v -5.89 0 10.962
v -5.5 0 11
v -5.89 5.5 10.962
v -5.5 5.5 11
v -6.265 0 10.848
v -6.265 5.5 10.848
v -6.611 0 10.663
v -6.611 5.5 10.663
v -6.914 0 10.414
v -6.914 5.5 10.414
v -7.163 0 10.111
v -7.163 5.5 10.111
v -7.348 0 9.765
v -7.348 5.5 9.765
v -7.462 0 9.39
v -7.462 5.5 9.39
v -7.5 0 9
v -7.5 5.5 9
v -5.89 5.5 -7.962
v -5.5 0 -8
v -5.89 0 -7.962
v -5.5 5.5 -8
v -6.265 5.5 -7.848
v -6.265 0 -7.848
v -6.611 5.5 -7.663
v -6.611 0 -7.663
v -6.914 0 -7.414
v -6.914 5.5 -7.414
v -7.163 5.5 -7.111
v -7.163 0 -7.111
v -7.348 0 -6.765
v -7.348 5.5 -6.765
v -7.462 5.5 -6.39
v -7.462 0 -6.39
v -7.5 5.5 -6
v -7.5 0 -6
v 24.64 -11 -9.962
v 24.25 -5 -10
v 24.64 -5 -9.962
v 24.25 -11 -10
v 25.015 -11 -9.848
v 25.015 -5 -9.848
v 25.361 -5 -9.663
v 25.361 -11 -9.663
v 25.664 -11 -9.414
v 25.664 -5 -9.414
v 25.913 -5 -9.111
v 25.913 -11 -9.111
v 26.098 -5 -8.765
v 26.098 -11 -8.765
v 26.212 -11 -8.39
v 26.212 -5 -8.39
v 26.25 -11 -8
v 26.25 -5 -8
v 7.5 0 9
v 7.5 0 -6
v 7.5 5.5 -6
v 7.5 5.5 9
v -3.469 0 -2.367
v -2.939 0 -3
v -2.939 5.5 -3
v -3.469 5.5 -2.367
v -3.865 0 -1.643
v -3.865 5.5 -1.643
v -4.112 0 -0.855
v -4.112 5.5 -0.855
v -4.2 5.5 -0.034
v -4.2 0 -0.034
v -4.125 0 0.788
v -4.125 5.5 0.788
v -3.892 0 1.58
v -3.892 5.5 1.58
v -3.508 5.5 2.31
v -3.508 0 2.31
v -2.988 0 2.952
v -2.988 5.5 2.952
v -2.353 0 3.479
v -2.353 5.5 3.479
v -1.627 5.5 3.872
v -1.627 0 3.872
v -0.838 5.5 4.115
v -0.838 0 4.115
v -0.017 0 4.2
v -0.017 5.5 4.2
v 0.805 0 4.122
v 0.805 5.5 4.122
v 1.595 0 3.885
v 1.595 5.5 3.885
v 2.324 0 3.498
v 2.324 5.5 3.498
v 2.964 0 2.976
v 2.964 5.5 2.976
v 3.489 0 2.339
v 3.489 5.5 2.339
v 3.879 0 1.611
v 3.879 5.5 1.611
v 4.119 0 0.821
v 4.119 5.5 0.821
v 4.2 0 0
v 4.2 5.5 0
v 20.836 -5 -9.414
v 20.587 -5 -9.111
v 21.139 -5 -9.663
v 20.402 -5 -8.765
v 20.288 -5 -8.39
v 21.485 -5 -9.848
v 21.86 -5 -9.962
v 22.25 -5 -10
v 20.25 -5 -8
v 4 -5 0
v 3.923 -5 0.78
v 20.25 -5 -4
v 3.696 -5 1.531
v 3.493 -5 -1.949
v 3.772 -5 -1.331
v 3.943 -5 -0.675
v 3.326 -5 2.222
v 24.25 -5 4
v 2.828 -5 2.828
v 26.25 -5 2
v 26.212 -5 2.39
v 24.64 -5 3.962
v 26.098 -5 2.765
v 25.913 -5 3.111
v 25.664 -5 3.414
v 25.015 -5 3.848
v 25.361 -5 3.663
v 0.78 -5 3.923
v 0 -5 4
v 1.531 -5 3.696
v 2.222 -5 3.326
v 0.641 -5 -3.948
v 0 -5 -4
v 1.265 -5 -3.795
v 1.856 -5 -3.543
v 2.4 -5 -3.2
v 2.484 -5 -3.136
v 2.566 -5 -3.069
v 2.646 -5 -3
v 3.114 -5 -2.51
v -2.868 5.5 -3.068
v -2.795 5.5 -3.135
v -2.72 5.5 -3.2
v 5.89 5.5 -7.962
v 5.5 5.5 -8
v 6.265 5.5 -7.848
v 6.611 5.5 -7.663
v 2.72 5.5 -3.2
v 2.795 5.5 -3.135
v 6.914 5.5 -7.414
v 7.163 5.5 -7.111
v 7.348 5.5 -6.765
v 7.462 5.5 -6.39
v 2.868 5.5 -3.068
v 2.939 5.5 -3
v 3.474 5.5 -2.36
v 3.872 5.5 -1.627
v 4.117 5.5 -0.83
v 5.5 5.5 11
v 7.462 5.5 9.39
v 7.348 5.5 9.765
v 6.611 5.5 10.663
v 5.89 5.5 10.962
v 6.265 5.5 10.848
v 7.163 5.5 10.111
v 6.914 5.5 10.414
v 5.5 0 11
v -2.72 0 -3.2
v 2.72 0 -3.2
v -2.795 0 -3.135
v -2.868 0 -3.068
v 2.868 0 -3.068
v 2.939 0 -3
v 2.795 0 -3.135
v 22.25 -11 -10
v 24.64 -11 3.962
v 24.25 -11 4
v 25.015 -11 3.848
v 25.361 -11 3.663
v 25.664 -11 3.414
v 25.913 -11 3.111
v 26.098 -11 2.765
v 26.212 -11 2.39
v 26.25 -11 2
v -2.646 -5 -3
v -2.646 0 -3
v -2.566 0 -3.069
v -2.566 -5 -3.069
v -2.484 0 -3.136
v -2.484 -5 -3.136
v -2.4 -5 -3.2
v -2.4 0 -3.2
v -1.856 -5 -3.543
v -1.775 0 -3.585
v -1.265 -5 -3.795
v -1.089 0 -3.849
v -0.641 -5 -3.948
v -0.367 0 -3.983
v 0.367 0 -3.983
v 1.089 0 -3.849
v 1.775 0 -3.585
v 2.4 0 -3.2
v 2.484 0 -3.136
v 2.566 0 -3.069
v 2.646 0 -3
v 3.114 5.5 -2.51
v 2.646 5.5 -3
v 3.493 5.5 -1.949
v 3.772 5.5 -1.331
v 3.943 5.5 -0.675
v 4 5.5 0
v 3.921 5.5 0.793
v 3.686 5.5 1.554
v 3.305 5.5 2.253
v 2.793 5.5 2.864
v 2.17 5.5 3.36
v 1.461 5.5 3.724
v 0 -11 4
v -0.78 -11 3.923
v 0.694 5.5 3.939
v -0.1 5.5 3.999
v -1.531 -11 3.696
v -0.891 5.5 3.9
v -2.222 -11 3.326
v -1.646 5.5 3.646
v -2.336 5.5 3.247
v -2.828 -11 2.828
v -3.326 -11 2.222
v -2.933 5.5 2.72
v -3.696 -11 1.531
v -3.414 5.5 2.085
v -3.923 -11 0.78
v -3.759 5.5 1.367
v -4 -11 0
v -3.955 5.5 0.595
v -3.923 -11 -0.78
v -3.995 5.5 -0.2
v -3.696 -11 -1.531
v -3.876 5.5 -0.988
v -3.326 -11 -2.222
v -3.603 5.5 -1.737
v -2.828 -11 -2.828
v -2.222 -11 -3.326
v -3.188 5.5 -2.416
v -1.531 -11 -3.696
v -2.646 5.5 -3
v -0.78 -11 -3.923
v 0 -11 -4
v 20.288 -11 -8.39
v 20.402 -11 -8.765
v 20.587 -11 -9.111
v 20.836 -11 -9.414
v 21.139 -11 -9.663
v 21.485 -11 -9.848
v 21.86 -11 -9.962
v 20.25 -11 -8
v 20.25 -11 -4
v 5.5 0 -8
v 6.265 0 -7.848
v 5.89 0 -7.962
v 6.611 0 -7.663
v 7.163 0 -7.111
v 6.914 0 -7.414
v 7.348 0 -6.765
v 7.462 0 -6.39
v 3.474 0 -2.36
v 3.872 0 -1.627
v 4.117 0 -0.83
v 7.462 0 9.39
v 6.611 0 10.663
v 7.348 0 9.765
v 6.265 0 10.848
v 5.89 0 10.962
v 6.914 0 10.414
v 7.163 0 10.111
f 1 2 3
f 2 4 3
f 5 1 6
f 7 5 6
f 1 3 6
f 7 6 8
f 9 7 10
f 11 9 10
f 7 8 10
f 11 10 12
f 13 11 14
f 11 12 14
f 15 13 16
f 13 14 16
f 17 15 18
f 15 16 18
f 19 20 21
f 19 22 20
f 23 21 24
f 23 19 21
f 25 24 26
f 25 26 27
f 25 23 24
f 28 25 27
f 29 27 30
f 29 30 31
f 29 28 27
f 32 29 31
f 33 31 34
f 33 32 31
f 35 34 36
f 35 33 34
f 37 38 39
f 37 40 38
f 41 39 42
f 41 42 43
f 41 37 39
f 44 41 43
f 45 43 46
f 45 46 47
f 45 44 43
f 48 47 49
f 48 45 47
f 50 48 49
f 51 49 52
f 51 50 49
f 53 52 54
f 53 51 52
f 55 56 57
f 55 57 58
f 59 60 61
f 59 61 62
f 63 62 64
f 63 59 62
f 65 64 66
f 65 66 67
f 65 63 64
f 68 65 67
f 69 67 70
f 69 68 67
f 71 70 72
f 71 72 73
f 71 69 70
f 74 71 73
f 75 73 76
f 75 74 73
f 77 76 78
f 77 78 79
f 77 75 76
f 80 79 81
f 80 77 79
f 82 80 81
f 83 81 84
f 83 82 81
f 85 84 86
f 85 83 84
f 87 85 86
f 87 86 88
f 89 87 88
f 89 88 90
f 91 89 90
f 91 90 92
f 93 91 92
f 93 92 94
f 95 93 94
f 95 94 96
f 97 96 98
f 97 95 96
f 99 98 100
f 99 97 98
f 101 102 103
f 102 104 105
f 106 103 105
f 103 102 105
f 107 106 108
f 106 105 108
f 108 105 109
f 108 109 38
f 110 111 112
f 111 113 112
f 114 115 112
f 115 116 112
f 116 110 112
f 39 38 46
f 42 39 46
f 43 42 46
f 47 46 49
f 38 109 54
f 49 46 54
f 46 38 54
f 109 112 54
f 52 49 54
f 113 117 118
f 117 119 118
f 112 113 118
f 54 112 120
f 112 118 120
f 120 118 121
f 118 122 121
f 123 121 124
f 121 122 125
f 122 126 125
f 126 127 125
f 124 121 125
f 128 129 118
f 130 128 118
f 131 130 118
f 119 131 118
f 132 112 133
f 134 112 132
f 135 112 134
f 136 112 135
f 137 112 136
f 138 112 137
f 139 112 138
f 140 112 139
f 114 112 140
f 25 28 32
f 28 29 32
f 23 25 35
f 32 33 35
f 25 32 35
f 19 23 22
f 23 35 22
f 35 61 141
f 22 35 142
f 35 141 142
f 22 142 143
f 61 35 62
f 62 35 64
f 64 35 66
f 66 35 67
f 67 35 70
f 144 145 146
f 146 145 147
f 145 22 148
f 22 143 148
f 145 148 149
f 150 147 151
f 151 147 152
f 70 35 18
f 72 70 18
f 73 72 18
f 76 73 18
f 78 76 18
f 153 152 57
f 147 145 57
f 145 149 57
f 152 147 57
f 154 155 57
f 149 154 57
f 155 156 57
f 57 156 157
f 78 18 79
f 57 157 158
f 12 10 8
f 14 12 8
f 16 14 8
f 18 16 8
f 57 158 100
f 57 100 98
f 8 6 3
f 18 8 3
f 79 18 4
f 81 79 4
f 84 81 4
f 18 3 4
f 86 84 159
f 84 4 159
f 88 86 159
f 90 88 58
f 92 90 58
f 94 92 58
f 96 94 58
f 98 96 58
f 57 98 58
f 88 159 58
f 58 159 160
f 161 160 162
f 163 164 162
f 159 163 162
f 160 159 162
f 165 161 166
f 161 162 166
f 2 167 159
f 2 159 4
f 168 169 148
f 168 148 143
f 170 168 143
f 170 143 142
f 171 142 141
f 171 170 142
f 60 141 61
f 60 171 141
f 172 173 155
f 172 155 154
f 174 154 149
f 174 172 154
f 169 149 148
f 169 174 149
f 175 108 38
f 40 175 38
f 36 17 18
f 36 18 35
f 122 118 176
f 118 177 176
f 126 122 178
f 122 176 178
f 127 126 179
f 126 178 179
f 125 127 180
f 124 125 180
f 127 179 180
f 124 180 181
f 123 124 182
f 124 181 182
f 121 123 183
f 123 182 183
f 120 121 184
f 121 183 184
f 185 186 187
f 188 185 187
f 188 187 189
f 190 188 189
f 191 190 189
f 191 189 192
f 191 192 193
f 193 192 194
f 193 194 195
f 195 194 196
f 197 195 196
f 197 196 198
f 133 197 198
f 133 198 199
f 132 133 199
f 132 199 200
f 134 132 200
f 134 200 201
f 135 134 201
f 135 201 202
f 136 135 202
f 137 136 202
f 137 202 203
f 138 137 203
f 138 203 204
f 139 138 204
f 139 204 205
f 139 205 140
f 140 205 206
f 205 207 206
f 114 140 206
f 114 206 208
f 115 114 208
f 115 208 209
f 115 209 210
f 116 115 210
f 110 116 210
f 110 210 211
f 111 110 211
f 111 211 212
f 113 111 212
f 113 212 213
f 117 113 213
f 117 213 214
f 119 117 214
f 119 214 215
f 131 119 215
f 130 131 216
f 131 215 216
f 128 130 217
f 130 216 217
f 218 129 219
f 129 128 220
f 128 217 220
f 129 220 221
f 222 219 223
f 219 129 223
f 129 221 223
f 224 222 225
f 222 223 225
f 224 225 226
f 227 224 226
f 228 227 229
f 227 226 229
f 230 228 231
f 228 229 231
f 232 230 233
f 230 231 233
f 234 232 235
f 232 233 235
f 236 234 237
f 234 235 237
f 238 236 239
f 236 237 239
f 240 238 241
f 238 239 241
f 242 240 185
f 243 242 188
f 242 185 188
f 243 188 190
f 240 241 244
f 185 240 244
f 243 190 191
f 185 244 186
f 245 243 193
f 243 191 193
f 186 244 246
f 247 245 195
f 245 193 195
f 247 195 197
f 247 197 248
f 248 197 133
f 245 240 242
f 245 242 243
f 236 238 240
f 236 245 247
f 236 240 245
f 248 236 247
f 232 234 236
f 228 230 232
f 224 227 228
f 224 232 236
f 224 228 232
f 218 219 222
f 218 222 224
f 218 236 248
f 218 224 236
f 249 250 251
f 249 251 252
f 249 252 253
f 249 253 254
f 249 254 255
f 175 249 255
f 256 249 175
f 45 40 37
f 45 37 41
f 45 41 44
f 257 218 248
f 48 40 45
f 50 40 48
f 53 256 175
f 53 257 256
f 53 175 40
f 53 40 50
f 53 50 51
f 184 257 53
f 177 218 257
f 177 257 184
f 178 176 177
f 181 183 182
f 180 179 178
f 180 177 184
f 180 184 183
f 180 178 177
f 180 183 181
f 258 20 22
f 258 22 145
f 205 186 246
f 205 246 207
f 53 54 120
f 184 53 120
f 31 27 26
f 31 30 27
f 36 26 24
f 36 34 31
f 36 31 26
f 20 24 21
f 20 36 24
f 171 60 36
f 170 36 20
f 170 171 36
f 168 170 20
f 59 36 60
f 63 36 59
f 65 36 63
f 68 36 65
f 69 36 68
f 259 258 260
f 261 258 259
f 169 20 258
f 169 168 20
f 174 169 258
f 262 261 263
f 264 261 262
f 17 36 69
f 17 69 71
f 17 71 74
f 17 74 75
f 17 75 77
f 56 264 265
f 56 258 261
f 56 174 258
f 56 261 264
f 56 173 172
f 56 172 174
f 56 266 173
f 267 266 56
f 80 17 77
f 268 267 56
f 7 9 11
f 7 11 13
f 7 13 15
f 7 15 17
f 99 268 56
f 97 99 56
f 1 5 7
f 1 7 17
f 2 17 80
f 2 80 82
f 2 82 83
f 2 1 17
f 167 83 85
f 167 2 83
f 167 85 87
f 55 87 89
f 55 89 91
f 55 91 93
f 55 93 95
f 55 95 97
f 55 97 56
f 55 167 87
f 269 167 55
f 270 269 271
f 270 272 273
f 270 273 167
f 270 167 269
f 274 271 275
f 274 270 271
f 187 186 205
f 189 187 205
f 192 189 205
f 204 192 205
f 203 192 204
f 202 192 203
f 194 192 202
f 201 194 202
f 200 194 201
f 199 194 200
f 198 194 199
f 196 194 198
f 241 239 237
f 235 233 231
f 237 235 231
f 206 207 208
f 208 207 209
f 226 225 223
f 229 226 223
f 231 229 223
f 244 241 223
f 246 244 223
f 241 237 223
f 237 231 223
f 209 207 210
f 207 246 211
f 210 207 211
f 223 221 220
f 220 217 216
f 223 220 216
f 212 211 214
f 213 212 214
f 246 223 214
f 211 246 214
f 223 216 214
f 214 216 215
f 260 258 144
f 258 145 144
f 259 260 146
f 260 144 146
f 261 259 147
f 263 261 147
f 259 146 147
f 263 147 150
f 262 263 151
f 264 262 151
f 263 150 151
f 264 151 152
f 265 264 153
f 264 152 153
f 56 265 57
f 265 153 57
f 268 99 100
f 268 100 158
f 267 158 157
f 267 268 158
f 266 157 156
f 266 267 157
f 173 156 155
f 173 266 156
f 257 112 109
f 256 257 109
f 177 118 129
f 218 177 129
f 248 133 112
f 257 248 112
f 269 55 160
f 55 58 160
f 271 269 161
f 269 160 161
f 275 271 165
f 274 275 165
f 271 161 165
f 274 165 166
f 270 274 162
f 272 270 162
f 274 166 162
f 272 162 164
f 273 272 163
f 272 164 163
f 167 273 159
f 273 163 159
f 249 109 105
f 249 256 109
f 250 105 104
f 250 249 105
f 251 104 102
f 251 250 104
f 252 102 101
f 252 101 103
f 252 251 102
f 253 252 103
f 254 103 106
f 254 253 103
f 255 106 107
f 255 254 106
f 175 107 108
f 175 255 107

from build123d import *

# Parameters (mm, degrees)
F1_DEPTH = 5.5
F2_R     = 2
F3_DEPTH = 5.5
F4_DEPTH = 5
F6_DEPTH = 6
F7_R     = 2


with BuildPart() as f1:
    # F0 (on Front) → F1 (new body)
    with BuildSketch(Plane.XZ):
        with BuildLine():
            ThreePointArc((2.7202941017, -3.2), (0, -4.2), (-2.7202941017, -3.2))
            Line((-2.7202941017, -3.2), (-7.5, -3.2))
            Line((-7.5, -3.2), (-7.5, -8))
            Line((-7.5, -8), (0, -8))
            Line((0, -8), (7.5, -8))
            Line((7.5, -8), (7.5, -3.2))
            Line((7.5, -3.2), (2.7202941017, -3.2))
        make_face()
        with BuildLine():
            ThreePointArc((2.4, -3.2), (0, -4), (-2.4, -3.2))
            Line((-2.4, -3.2), (-2.7202941017, -3.2))
            ThreePointArc((-2.7202941017, -3.2), (0, -4.2), (2.7202941017, -3.2))
            Line((2.7202941017, -3.2), (2.4, -3.2))
        make_face()
        with BuildLine():
            Line((2.4, -3.2), (-2.4, -3.2))
            ThreePointArc((-2.4, -3.2), (0, -4), (2.4, -3.2))
        make_face()
        with BuildLine():
            Line((7.5, -3), (2.9393876913, -3))
            ThreePointArc((2.9393876913, -3), (2.8316072291, -3.1019349607), (2.7202941017, -3.2))
            Line((2.7202941017, -3.2), (7.5, -3.2))
            Line((7.5, -3.2), (7.5, -3))
        make_face()
        with BuildLine():
            ThreePointArc((-2.7202941017, -3.2), (-2.8316072291, -3.1019349607), (-2.9393876913, -3))
            Line((-2.9393876913, -3), (-7.5, -3))
            Line((-7.5, -3), (-7.5, -3.2))
            Line((-7.5, -3.2), (-2.7202941017, -3.2))
        make_face()
        with BuildLine():
            Line((-7.5, -3), (-2.9393876913, -3))
            ThreePointArc((-2.9393876913, -3), (-1.6270482009, 3.872042633), (4.2, 0))
            ThreePointArc((4.2, 0), (3.872042633, -1.6270482009), (2.9393876913, -3))
            Line((2.9393876913, -3), (7.5, -3))
            Line((7.5, -3), (7.5, 11))
            Line((7.5, 11), (0, 11))
            Line((0, 11), (-7.5, 11))
            Line((-7.5, 11), (-7.5, -3))
        make_face()
    extrude(amount=-F1_DEPTH)

    # F2
    f2_edges = [f1.edges().sort_by_distance(p)[0] for p in [
        (-7.5, 2.75, -8),
        (7.5, 2.75, -8),
        (-7.5, 2.75, 11),
        (7.5, 2.75, 11),
    ]]
    fillet(f2_edges, radius=F2_R)


with BuildPart() as f3:
    # F0 (on Front) → F3 (new body, through all)
    with BuildSketch(Plane.XZ):
        with BuildLine():
            ThreePointArc((2.6457513111, -3), (3.6457513111, -1.6457513111), (4, 0))
            ThreePointArc((4, 0), (-1.6457513111, 3.6457513111), (-2.6457513111, -3))
            Line((-2.6457513111, -3), (2.6457513111, -3))
        make_face()
    extrude(amount=-F3_DEPTH)

    # F0 (on Front) → F4 (join)
    with BuildSketch(Plane.XZ):
        with BuildLine():
            ThreePointArc((2.6457513111, -3), (3.6457513111, -1.6457513111), (4, 0))
            ThreePointArc((4, 0), (-1.6457513111, 3.6457513111), (-2.6457513111, -3))
            Line((-2.6457513111, -3), (2.6457513111, -3))
        make_face()
        with BuildLine():
            Line((2.4, -3.2), (-2.4, -3.2))
            ThreePointArc((-2.4, -3.2), (0, -4), (2.4, -3.2))
        make_face()
        with BuildLine():
            Line((2.6457513111, -3), (-2.6457513111, -3))
            ThreePointArc((-2.6457513111, -3), (-2.5248567431, -3.1024342744), (-2.4, -3.2))
            Line((-2.4, -3.2), (2.4, -3.2))
            ThreePointArc((2.4, -3.2), (2.5248567431, -3.1024342744), (2.6457513111, -3))
        make_face()
    extrude(amount=F4_DEPTH)

    # F5 (on face) → F6 (join)
    with BuildSketch(Plane.XZ.offset(5)):
        with BuildLine():
            Line((18.25, 4), (0, 4))
            ThreePointArc((0, 4), (2.8284271247, 2.8284271247), (4, 0))
            ThreePointArc((4, 0), (2.8284271247, -2.8284271247), (0, -4))
            Line((0, -4), (18.25, -4))
            Line((18.25, -4), (20.25, -4))
            Line((20.25, -4), (20.25, -10))
            Line((20.25, -10), (26.25, -10))
            Line((26.25, -10), (26.25, 4))
            Line((26.25, 4), (20.25, 4))
            Line((20.25, 4), (18.25, 4))
        make_face()
        with BuildLine():
            ThreePointArc((4, 0), (2.8284271247, 2.8284271247), (0, 4))
            ThreePointArc((0, 4), (-4, 0), (0, -4))
            ThreePointArc((0, -4), (2.8284271247, -2.8284271247), (4, 0))
        make_face()
    extrude(amount=F6_DEPTH)

    # F7
    f7_edges = [f3.edges().sort_by_distance(p)[0] for p in [
        (26.25, -8, 4),
        (26.25, -8, -10),
        (20.25, -8, -10),
    ]]
    fillet(f7_edges, radius=F7_R)


solid = Compound([f1.part, f3.part])
